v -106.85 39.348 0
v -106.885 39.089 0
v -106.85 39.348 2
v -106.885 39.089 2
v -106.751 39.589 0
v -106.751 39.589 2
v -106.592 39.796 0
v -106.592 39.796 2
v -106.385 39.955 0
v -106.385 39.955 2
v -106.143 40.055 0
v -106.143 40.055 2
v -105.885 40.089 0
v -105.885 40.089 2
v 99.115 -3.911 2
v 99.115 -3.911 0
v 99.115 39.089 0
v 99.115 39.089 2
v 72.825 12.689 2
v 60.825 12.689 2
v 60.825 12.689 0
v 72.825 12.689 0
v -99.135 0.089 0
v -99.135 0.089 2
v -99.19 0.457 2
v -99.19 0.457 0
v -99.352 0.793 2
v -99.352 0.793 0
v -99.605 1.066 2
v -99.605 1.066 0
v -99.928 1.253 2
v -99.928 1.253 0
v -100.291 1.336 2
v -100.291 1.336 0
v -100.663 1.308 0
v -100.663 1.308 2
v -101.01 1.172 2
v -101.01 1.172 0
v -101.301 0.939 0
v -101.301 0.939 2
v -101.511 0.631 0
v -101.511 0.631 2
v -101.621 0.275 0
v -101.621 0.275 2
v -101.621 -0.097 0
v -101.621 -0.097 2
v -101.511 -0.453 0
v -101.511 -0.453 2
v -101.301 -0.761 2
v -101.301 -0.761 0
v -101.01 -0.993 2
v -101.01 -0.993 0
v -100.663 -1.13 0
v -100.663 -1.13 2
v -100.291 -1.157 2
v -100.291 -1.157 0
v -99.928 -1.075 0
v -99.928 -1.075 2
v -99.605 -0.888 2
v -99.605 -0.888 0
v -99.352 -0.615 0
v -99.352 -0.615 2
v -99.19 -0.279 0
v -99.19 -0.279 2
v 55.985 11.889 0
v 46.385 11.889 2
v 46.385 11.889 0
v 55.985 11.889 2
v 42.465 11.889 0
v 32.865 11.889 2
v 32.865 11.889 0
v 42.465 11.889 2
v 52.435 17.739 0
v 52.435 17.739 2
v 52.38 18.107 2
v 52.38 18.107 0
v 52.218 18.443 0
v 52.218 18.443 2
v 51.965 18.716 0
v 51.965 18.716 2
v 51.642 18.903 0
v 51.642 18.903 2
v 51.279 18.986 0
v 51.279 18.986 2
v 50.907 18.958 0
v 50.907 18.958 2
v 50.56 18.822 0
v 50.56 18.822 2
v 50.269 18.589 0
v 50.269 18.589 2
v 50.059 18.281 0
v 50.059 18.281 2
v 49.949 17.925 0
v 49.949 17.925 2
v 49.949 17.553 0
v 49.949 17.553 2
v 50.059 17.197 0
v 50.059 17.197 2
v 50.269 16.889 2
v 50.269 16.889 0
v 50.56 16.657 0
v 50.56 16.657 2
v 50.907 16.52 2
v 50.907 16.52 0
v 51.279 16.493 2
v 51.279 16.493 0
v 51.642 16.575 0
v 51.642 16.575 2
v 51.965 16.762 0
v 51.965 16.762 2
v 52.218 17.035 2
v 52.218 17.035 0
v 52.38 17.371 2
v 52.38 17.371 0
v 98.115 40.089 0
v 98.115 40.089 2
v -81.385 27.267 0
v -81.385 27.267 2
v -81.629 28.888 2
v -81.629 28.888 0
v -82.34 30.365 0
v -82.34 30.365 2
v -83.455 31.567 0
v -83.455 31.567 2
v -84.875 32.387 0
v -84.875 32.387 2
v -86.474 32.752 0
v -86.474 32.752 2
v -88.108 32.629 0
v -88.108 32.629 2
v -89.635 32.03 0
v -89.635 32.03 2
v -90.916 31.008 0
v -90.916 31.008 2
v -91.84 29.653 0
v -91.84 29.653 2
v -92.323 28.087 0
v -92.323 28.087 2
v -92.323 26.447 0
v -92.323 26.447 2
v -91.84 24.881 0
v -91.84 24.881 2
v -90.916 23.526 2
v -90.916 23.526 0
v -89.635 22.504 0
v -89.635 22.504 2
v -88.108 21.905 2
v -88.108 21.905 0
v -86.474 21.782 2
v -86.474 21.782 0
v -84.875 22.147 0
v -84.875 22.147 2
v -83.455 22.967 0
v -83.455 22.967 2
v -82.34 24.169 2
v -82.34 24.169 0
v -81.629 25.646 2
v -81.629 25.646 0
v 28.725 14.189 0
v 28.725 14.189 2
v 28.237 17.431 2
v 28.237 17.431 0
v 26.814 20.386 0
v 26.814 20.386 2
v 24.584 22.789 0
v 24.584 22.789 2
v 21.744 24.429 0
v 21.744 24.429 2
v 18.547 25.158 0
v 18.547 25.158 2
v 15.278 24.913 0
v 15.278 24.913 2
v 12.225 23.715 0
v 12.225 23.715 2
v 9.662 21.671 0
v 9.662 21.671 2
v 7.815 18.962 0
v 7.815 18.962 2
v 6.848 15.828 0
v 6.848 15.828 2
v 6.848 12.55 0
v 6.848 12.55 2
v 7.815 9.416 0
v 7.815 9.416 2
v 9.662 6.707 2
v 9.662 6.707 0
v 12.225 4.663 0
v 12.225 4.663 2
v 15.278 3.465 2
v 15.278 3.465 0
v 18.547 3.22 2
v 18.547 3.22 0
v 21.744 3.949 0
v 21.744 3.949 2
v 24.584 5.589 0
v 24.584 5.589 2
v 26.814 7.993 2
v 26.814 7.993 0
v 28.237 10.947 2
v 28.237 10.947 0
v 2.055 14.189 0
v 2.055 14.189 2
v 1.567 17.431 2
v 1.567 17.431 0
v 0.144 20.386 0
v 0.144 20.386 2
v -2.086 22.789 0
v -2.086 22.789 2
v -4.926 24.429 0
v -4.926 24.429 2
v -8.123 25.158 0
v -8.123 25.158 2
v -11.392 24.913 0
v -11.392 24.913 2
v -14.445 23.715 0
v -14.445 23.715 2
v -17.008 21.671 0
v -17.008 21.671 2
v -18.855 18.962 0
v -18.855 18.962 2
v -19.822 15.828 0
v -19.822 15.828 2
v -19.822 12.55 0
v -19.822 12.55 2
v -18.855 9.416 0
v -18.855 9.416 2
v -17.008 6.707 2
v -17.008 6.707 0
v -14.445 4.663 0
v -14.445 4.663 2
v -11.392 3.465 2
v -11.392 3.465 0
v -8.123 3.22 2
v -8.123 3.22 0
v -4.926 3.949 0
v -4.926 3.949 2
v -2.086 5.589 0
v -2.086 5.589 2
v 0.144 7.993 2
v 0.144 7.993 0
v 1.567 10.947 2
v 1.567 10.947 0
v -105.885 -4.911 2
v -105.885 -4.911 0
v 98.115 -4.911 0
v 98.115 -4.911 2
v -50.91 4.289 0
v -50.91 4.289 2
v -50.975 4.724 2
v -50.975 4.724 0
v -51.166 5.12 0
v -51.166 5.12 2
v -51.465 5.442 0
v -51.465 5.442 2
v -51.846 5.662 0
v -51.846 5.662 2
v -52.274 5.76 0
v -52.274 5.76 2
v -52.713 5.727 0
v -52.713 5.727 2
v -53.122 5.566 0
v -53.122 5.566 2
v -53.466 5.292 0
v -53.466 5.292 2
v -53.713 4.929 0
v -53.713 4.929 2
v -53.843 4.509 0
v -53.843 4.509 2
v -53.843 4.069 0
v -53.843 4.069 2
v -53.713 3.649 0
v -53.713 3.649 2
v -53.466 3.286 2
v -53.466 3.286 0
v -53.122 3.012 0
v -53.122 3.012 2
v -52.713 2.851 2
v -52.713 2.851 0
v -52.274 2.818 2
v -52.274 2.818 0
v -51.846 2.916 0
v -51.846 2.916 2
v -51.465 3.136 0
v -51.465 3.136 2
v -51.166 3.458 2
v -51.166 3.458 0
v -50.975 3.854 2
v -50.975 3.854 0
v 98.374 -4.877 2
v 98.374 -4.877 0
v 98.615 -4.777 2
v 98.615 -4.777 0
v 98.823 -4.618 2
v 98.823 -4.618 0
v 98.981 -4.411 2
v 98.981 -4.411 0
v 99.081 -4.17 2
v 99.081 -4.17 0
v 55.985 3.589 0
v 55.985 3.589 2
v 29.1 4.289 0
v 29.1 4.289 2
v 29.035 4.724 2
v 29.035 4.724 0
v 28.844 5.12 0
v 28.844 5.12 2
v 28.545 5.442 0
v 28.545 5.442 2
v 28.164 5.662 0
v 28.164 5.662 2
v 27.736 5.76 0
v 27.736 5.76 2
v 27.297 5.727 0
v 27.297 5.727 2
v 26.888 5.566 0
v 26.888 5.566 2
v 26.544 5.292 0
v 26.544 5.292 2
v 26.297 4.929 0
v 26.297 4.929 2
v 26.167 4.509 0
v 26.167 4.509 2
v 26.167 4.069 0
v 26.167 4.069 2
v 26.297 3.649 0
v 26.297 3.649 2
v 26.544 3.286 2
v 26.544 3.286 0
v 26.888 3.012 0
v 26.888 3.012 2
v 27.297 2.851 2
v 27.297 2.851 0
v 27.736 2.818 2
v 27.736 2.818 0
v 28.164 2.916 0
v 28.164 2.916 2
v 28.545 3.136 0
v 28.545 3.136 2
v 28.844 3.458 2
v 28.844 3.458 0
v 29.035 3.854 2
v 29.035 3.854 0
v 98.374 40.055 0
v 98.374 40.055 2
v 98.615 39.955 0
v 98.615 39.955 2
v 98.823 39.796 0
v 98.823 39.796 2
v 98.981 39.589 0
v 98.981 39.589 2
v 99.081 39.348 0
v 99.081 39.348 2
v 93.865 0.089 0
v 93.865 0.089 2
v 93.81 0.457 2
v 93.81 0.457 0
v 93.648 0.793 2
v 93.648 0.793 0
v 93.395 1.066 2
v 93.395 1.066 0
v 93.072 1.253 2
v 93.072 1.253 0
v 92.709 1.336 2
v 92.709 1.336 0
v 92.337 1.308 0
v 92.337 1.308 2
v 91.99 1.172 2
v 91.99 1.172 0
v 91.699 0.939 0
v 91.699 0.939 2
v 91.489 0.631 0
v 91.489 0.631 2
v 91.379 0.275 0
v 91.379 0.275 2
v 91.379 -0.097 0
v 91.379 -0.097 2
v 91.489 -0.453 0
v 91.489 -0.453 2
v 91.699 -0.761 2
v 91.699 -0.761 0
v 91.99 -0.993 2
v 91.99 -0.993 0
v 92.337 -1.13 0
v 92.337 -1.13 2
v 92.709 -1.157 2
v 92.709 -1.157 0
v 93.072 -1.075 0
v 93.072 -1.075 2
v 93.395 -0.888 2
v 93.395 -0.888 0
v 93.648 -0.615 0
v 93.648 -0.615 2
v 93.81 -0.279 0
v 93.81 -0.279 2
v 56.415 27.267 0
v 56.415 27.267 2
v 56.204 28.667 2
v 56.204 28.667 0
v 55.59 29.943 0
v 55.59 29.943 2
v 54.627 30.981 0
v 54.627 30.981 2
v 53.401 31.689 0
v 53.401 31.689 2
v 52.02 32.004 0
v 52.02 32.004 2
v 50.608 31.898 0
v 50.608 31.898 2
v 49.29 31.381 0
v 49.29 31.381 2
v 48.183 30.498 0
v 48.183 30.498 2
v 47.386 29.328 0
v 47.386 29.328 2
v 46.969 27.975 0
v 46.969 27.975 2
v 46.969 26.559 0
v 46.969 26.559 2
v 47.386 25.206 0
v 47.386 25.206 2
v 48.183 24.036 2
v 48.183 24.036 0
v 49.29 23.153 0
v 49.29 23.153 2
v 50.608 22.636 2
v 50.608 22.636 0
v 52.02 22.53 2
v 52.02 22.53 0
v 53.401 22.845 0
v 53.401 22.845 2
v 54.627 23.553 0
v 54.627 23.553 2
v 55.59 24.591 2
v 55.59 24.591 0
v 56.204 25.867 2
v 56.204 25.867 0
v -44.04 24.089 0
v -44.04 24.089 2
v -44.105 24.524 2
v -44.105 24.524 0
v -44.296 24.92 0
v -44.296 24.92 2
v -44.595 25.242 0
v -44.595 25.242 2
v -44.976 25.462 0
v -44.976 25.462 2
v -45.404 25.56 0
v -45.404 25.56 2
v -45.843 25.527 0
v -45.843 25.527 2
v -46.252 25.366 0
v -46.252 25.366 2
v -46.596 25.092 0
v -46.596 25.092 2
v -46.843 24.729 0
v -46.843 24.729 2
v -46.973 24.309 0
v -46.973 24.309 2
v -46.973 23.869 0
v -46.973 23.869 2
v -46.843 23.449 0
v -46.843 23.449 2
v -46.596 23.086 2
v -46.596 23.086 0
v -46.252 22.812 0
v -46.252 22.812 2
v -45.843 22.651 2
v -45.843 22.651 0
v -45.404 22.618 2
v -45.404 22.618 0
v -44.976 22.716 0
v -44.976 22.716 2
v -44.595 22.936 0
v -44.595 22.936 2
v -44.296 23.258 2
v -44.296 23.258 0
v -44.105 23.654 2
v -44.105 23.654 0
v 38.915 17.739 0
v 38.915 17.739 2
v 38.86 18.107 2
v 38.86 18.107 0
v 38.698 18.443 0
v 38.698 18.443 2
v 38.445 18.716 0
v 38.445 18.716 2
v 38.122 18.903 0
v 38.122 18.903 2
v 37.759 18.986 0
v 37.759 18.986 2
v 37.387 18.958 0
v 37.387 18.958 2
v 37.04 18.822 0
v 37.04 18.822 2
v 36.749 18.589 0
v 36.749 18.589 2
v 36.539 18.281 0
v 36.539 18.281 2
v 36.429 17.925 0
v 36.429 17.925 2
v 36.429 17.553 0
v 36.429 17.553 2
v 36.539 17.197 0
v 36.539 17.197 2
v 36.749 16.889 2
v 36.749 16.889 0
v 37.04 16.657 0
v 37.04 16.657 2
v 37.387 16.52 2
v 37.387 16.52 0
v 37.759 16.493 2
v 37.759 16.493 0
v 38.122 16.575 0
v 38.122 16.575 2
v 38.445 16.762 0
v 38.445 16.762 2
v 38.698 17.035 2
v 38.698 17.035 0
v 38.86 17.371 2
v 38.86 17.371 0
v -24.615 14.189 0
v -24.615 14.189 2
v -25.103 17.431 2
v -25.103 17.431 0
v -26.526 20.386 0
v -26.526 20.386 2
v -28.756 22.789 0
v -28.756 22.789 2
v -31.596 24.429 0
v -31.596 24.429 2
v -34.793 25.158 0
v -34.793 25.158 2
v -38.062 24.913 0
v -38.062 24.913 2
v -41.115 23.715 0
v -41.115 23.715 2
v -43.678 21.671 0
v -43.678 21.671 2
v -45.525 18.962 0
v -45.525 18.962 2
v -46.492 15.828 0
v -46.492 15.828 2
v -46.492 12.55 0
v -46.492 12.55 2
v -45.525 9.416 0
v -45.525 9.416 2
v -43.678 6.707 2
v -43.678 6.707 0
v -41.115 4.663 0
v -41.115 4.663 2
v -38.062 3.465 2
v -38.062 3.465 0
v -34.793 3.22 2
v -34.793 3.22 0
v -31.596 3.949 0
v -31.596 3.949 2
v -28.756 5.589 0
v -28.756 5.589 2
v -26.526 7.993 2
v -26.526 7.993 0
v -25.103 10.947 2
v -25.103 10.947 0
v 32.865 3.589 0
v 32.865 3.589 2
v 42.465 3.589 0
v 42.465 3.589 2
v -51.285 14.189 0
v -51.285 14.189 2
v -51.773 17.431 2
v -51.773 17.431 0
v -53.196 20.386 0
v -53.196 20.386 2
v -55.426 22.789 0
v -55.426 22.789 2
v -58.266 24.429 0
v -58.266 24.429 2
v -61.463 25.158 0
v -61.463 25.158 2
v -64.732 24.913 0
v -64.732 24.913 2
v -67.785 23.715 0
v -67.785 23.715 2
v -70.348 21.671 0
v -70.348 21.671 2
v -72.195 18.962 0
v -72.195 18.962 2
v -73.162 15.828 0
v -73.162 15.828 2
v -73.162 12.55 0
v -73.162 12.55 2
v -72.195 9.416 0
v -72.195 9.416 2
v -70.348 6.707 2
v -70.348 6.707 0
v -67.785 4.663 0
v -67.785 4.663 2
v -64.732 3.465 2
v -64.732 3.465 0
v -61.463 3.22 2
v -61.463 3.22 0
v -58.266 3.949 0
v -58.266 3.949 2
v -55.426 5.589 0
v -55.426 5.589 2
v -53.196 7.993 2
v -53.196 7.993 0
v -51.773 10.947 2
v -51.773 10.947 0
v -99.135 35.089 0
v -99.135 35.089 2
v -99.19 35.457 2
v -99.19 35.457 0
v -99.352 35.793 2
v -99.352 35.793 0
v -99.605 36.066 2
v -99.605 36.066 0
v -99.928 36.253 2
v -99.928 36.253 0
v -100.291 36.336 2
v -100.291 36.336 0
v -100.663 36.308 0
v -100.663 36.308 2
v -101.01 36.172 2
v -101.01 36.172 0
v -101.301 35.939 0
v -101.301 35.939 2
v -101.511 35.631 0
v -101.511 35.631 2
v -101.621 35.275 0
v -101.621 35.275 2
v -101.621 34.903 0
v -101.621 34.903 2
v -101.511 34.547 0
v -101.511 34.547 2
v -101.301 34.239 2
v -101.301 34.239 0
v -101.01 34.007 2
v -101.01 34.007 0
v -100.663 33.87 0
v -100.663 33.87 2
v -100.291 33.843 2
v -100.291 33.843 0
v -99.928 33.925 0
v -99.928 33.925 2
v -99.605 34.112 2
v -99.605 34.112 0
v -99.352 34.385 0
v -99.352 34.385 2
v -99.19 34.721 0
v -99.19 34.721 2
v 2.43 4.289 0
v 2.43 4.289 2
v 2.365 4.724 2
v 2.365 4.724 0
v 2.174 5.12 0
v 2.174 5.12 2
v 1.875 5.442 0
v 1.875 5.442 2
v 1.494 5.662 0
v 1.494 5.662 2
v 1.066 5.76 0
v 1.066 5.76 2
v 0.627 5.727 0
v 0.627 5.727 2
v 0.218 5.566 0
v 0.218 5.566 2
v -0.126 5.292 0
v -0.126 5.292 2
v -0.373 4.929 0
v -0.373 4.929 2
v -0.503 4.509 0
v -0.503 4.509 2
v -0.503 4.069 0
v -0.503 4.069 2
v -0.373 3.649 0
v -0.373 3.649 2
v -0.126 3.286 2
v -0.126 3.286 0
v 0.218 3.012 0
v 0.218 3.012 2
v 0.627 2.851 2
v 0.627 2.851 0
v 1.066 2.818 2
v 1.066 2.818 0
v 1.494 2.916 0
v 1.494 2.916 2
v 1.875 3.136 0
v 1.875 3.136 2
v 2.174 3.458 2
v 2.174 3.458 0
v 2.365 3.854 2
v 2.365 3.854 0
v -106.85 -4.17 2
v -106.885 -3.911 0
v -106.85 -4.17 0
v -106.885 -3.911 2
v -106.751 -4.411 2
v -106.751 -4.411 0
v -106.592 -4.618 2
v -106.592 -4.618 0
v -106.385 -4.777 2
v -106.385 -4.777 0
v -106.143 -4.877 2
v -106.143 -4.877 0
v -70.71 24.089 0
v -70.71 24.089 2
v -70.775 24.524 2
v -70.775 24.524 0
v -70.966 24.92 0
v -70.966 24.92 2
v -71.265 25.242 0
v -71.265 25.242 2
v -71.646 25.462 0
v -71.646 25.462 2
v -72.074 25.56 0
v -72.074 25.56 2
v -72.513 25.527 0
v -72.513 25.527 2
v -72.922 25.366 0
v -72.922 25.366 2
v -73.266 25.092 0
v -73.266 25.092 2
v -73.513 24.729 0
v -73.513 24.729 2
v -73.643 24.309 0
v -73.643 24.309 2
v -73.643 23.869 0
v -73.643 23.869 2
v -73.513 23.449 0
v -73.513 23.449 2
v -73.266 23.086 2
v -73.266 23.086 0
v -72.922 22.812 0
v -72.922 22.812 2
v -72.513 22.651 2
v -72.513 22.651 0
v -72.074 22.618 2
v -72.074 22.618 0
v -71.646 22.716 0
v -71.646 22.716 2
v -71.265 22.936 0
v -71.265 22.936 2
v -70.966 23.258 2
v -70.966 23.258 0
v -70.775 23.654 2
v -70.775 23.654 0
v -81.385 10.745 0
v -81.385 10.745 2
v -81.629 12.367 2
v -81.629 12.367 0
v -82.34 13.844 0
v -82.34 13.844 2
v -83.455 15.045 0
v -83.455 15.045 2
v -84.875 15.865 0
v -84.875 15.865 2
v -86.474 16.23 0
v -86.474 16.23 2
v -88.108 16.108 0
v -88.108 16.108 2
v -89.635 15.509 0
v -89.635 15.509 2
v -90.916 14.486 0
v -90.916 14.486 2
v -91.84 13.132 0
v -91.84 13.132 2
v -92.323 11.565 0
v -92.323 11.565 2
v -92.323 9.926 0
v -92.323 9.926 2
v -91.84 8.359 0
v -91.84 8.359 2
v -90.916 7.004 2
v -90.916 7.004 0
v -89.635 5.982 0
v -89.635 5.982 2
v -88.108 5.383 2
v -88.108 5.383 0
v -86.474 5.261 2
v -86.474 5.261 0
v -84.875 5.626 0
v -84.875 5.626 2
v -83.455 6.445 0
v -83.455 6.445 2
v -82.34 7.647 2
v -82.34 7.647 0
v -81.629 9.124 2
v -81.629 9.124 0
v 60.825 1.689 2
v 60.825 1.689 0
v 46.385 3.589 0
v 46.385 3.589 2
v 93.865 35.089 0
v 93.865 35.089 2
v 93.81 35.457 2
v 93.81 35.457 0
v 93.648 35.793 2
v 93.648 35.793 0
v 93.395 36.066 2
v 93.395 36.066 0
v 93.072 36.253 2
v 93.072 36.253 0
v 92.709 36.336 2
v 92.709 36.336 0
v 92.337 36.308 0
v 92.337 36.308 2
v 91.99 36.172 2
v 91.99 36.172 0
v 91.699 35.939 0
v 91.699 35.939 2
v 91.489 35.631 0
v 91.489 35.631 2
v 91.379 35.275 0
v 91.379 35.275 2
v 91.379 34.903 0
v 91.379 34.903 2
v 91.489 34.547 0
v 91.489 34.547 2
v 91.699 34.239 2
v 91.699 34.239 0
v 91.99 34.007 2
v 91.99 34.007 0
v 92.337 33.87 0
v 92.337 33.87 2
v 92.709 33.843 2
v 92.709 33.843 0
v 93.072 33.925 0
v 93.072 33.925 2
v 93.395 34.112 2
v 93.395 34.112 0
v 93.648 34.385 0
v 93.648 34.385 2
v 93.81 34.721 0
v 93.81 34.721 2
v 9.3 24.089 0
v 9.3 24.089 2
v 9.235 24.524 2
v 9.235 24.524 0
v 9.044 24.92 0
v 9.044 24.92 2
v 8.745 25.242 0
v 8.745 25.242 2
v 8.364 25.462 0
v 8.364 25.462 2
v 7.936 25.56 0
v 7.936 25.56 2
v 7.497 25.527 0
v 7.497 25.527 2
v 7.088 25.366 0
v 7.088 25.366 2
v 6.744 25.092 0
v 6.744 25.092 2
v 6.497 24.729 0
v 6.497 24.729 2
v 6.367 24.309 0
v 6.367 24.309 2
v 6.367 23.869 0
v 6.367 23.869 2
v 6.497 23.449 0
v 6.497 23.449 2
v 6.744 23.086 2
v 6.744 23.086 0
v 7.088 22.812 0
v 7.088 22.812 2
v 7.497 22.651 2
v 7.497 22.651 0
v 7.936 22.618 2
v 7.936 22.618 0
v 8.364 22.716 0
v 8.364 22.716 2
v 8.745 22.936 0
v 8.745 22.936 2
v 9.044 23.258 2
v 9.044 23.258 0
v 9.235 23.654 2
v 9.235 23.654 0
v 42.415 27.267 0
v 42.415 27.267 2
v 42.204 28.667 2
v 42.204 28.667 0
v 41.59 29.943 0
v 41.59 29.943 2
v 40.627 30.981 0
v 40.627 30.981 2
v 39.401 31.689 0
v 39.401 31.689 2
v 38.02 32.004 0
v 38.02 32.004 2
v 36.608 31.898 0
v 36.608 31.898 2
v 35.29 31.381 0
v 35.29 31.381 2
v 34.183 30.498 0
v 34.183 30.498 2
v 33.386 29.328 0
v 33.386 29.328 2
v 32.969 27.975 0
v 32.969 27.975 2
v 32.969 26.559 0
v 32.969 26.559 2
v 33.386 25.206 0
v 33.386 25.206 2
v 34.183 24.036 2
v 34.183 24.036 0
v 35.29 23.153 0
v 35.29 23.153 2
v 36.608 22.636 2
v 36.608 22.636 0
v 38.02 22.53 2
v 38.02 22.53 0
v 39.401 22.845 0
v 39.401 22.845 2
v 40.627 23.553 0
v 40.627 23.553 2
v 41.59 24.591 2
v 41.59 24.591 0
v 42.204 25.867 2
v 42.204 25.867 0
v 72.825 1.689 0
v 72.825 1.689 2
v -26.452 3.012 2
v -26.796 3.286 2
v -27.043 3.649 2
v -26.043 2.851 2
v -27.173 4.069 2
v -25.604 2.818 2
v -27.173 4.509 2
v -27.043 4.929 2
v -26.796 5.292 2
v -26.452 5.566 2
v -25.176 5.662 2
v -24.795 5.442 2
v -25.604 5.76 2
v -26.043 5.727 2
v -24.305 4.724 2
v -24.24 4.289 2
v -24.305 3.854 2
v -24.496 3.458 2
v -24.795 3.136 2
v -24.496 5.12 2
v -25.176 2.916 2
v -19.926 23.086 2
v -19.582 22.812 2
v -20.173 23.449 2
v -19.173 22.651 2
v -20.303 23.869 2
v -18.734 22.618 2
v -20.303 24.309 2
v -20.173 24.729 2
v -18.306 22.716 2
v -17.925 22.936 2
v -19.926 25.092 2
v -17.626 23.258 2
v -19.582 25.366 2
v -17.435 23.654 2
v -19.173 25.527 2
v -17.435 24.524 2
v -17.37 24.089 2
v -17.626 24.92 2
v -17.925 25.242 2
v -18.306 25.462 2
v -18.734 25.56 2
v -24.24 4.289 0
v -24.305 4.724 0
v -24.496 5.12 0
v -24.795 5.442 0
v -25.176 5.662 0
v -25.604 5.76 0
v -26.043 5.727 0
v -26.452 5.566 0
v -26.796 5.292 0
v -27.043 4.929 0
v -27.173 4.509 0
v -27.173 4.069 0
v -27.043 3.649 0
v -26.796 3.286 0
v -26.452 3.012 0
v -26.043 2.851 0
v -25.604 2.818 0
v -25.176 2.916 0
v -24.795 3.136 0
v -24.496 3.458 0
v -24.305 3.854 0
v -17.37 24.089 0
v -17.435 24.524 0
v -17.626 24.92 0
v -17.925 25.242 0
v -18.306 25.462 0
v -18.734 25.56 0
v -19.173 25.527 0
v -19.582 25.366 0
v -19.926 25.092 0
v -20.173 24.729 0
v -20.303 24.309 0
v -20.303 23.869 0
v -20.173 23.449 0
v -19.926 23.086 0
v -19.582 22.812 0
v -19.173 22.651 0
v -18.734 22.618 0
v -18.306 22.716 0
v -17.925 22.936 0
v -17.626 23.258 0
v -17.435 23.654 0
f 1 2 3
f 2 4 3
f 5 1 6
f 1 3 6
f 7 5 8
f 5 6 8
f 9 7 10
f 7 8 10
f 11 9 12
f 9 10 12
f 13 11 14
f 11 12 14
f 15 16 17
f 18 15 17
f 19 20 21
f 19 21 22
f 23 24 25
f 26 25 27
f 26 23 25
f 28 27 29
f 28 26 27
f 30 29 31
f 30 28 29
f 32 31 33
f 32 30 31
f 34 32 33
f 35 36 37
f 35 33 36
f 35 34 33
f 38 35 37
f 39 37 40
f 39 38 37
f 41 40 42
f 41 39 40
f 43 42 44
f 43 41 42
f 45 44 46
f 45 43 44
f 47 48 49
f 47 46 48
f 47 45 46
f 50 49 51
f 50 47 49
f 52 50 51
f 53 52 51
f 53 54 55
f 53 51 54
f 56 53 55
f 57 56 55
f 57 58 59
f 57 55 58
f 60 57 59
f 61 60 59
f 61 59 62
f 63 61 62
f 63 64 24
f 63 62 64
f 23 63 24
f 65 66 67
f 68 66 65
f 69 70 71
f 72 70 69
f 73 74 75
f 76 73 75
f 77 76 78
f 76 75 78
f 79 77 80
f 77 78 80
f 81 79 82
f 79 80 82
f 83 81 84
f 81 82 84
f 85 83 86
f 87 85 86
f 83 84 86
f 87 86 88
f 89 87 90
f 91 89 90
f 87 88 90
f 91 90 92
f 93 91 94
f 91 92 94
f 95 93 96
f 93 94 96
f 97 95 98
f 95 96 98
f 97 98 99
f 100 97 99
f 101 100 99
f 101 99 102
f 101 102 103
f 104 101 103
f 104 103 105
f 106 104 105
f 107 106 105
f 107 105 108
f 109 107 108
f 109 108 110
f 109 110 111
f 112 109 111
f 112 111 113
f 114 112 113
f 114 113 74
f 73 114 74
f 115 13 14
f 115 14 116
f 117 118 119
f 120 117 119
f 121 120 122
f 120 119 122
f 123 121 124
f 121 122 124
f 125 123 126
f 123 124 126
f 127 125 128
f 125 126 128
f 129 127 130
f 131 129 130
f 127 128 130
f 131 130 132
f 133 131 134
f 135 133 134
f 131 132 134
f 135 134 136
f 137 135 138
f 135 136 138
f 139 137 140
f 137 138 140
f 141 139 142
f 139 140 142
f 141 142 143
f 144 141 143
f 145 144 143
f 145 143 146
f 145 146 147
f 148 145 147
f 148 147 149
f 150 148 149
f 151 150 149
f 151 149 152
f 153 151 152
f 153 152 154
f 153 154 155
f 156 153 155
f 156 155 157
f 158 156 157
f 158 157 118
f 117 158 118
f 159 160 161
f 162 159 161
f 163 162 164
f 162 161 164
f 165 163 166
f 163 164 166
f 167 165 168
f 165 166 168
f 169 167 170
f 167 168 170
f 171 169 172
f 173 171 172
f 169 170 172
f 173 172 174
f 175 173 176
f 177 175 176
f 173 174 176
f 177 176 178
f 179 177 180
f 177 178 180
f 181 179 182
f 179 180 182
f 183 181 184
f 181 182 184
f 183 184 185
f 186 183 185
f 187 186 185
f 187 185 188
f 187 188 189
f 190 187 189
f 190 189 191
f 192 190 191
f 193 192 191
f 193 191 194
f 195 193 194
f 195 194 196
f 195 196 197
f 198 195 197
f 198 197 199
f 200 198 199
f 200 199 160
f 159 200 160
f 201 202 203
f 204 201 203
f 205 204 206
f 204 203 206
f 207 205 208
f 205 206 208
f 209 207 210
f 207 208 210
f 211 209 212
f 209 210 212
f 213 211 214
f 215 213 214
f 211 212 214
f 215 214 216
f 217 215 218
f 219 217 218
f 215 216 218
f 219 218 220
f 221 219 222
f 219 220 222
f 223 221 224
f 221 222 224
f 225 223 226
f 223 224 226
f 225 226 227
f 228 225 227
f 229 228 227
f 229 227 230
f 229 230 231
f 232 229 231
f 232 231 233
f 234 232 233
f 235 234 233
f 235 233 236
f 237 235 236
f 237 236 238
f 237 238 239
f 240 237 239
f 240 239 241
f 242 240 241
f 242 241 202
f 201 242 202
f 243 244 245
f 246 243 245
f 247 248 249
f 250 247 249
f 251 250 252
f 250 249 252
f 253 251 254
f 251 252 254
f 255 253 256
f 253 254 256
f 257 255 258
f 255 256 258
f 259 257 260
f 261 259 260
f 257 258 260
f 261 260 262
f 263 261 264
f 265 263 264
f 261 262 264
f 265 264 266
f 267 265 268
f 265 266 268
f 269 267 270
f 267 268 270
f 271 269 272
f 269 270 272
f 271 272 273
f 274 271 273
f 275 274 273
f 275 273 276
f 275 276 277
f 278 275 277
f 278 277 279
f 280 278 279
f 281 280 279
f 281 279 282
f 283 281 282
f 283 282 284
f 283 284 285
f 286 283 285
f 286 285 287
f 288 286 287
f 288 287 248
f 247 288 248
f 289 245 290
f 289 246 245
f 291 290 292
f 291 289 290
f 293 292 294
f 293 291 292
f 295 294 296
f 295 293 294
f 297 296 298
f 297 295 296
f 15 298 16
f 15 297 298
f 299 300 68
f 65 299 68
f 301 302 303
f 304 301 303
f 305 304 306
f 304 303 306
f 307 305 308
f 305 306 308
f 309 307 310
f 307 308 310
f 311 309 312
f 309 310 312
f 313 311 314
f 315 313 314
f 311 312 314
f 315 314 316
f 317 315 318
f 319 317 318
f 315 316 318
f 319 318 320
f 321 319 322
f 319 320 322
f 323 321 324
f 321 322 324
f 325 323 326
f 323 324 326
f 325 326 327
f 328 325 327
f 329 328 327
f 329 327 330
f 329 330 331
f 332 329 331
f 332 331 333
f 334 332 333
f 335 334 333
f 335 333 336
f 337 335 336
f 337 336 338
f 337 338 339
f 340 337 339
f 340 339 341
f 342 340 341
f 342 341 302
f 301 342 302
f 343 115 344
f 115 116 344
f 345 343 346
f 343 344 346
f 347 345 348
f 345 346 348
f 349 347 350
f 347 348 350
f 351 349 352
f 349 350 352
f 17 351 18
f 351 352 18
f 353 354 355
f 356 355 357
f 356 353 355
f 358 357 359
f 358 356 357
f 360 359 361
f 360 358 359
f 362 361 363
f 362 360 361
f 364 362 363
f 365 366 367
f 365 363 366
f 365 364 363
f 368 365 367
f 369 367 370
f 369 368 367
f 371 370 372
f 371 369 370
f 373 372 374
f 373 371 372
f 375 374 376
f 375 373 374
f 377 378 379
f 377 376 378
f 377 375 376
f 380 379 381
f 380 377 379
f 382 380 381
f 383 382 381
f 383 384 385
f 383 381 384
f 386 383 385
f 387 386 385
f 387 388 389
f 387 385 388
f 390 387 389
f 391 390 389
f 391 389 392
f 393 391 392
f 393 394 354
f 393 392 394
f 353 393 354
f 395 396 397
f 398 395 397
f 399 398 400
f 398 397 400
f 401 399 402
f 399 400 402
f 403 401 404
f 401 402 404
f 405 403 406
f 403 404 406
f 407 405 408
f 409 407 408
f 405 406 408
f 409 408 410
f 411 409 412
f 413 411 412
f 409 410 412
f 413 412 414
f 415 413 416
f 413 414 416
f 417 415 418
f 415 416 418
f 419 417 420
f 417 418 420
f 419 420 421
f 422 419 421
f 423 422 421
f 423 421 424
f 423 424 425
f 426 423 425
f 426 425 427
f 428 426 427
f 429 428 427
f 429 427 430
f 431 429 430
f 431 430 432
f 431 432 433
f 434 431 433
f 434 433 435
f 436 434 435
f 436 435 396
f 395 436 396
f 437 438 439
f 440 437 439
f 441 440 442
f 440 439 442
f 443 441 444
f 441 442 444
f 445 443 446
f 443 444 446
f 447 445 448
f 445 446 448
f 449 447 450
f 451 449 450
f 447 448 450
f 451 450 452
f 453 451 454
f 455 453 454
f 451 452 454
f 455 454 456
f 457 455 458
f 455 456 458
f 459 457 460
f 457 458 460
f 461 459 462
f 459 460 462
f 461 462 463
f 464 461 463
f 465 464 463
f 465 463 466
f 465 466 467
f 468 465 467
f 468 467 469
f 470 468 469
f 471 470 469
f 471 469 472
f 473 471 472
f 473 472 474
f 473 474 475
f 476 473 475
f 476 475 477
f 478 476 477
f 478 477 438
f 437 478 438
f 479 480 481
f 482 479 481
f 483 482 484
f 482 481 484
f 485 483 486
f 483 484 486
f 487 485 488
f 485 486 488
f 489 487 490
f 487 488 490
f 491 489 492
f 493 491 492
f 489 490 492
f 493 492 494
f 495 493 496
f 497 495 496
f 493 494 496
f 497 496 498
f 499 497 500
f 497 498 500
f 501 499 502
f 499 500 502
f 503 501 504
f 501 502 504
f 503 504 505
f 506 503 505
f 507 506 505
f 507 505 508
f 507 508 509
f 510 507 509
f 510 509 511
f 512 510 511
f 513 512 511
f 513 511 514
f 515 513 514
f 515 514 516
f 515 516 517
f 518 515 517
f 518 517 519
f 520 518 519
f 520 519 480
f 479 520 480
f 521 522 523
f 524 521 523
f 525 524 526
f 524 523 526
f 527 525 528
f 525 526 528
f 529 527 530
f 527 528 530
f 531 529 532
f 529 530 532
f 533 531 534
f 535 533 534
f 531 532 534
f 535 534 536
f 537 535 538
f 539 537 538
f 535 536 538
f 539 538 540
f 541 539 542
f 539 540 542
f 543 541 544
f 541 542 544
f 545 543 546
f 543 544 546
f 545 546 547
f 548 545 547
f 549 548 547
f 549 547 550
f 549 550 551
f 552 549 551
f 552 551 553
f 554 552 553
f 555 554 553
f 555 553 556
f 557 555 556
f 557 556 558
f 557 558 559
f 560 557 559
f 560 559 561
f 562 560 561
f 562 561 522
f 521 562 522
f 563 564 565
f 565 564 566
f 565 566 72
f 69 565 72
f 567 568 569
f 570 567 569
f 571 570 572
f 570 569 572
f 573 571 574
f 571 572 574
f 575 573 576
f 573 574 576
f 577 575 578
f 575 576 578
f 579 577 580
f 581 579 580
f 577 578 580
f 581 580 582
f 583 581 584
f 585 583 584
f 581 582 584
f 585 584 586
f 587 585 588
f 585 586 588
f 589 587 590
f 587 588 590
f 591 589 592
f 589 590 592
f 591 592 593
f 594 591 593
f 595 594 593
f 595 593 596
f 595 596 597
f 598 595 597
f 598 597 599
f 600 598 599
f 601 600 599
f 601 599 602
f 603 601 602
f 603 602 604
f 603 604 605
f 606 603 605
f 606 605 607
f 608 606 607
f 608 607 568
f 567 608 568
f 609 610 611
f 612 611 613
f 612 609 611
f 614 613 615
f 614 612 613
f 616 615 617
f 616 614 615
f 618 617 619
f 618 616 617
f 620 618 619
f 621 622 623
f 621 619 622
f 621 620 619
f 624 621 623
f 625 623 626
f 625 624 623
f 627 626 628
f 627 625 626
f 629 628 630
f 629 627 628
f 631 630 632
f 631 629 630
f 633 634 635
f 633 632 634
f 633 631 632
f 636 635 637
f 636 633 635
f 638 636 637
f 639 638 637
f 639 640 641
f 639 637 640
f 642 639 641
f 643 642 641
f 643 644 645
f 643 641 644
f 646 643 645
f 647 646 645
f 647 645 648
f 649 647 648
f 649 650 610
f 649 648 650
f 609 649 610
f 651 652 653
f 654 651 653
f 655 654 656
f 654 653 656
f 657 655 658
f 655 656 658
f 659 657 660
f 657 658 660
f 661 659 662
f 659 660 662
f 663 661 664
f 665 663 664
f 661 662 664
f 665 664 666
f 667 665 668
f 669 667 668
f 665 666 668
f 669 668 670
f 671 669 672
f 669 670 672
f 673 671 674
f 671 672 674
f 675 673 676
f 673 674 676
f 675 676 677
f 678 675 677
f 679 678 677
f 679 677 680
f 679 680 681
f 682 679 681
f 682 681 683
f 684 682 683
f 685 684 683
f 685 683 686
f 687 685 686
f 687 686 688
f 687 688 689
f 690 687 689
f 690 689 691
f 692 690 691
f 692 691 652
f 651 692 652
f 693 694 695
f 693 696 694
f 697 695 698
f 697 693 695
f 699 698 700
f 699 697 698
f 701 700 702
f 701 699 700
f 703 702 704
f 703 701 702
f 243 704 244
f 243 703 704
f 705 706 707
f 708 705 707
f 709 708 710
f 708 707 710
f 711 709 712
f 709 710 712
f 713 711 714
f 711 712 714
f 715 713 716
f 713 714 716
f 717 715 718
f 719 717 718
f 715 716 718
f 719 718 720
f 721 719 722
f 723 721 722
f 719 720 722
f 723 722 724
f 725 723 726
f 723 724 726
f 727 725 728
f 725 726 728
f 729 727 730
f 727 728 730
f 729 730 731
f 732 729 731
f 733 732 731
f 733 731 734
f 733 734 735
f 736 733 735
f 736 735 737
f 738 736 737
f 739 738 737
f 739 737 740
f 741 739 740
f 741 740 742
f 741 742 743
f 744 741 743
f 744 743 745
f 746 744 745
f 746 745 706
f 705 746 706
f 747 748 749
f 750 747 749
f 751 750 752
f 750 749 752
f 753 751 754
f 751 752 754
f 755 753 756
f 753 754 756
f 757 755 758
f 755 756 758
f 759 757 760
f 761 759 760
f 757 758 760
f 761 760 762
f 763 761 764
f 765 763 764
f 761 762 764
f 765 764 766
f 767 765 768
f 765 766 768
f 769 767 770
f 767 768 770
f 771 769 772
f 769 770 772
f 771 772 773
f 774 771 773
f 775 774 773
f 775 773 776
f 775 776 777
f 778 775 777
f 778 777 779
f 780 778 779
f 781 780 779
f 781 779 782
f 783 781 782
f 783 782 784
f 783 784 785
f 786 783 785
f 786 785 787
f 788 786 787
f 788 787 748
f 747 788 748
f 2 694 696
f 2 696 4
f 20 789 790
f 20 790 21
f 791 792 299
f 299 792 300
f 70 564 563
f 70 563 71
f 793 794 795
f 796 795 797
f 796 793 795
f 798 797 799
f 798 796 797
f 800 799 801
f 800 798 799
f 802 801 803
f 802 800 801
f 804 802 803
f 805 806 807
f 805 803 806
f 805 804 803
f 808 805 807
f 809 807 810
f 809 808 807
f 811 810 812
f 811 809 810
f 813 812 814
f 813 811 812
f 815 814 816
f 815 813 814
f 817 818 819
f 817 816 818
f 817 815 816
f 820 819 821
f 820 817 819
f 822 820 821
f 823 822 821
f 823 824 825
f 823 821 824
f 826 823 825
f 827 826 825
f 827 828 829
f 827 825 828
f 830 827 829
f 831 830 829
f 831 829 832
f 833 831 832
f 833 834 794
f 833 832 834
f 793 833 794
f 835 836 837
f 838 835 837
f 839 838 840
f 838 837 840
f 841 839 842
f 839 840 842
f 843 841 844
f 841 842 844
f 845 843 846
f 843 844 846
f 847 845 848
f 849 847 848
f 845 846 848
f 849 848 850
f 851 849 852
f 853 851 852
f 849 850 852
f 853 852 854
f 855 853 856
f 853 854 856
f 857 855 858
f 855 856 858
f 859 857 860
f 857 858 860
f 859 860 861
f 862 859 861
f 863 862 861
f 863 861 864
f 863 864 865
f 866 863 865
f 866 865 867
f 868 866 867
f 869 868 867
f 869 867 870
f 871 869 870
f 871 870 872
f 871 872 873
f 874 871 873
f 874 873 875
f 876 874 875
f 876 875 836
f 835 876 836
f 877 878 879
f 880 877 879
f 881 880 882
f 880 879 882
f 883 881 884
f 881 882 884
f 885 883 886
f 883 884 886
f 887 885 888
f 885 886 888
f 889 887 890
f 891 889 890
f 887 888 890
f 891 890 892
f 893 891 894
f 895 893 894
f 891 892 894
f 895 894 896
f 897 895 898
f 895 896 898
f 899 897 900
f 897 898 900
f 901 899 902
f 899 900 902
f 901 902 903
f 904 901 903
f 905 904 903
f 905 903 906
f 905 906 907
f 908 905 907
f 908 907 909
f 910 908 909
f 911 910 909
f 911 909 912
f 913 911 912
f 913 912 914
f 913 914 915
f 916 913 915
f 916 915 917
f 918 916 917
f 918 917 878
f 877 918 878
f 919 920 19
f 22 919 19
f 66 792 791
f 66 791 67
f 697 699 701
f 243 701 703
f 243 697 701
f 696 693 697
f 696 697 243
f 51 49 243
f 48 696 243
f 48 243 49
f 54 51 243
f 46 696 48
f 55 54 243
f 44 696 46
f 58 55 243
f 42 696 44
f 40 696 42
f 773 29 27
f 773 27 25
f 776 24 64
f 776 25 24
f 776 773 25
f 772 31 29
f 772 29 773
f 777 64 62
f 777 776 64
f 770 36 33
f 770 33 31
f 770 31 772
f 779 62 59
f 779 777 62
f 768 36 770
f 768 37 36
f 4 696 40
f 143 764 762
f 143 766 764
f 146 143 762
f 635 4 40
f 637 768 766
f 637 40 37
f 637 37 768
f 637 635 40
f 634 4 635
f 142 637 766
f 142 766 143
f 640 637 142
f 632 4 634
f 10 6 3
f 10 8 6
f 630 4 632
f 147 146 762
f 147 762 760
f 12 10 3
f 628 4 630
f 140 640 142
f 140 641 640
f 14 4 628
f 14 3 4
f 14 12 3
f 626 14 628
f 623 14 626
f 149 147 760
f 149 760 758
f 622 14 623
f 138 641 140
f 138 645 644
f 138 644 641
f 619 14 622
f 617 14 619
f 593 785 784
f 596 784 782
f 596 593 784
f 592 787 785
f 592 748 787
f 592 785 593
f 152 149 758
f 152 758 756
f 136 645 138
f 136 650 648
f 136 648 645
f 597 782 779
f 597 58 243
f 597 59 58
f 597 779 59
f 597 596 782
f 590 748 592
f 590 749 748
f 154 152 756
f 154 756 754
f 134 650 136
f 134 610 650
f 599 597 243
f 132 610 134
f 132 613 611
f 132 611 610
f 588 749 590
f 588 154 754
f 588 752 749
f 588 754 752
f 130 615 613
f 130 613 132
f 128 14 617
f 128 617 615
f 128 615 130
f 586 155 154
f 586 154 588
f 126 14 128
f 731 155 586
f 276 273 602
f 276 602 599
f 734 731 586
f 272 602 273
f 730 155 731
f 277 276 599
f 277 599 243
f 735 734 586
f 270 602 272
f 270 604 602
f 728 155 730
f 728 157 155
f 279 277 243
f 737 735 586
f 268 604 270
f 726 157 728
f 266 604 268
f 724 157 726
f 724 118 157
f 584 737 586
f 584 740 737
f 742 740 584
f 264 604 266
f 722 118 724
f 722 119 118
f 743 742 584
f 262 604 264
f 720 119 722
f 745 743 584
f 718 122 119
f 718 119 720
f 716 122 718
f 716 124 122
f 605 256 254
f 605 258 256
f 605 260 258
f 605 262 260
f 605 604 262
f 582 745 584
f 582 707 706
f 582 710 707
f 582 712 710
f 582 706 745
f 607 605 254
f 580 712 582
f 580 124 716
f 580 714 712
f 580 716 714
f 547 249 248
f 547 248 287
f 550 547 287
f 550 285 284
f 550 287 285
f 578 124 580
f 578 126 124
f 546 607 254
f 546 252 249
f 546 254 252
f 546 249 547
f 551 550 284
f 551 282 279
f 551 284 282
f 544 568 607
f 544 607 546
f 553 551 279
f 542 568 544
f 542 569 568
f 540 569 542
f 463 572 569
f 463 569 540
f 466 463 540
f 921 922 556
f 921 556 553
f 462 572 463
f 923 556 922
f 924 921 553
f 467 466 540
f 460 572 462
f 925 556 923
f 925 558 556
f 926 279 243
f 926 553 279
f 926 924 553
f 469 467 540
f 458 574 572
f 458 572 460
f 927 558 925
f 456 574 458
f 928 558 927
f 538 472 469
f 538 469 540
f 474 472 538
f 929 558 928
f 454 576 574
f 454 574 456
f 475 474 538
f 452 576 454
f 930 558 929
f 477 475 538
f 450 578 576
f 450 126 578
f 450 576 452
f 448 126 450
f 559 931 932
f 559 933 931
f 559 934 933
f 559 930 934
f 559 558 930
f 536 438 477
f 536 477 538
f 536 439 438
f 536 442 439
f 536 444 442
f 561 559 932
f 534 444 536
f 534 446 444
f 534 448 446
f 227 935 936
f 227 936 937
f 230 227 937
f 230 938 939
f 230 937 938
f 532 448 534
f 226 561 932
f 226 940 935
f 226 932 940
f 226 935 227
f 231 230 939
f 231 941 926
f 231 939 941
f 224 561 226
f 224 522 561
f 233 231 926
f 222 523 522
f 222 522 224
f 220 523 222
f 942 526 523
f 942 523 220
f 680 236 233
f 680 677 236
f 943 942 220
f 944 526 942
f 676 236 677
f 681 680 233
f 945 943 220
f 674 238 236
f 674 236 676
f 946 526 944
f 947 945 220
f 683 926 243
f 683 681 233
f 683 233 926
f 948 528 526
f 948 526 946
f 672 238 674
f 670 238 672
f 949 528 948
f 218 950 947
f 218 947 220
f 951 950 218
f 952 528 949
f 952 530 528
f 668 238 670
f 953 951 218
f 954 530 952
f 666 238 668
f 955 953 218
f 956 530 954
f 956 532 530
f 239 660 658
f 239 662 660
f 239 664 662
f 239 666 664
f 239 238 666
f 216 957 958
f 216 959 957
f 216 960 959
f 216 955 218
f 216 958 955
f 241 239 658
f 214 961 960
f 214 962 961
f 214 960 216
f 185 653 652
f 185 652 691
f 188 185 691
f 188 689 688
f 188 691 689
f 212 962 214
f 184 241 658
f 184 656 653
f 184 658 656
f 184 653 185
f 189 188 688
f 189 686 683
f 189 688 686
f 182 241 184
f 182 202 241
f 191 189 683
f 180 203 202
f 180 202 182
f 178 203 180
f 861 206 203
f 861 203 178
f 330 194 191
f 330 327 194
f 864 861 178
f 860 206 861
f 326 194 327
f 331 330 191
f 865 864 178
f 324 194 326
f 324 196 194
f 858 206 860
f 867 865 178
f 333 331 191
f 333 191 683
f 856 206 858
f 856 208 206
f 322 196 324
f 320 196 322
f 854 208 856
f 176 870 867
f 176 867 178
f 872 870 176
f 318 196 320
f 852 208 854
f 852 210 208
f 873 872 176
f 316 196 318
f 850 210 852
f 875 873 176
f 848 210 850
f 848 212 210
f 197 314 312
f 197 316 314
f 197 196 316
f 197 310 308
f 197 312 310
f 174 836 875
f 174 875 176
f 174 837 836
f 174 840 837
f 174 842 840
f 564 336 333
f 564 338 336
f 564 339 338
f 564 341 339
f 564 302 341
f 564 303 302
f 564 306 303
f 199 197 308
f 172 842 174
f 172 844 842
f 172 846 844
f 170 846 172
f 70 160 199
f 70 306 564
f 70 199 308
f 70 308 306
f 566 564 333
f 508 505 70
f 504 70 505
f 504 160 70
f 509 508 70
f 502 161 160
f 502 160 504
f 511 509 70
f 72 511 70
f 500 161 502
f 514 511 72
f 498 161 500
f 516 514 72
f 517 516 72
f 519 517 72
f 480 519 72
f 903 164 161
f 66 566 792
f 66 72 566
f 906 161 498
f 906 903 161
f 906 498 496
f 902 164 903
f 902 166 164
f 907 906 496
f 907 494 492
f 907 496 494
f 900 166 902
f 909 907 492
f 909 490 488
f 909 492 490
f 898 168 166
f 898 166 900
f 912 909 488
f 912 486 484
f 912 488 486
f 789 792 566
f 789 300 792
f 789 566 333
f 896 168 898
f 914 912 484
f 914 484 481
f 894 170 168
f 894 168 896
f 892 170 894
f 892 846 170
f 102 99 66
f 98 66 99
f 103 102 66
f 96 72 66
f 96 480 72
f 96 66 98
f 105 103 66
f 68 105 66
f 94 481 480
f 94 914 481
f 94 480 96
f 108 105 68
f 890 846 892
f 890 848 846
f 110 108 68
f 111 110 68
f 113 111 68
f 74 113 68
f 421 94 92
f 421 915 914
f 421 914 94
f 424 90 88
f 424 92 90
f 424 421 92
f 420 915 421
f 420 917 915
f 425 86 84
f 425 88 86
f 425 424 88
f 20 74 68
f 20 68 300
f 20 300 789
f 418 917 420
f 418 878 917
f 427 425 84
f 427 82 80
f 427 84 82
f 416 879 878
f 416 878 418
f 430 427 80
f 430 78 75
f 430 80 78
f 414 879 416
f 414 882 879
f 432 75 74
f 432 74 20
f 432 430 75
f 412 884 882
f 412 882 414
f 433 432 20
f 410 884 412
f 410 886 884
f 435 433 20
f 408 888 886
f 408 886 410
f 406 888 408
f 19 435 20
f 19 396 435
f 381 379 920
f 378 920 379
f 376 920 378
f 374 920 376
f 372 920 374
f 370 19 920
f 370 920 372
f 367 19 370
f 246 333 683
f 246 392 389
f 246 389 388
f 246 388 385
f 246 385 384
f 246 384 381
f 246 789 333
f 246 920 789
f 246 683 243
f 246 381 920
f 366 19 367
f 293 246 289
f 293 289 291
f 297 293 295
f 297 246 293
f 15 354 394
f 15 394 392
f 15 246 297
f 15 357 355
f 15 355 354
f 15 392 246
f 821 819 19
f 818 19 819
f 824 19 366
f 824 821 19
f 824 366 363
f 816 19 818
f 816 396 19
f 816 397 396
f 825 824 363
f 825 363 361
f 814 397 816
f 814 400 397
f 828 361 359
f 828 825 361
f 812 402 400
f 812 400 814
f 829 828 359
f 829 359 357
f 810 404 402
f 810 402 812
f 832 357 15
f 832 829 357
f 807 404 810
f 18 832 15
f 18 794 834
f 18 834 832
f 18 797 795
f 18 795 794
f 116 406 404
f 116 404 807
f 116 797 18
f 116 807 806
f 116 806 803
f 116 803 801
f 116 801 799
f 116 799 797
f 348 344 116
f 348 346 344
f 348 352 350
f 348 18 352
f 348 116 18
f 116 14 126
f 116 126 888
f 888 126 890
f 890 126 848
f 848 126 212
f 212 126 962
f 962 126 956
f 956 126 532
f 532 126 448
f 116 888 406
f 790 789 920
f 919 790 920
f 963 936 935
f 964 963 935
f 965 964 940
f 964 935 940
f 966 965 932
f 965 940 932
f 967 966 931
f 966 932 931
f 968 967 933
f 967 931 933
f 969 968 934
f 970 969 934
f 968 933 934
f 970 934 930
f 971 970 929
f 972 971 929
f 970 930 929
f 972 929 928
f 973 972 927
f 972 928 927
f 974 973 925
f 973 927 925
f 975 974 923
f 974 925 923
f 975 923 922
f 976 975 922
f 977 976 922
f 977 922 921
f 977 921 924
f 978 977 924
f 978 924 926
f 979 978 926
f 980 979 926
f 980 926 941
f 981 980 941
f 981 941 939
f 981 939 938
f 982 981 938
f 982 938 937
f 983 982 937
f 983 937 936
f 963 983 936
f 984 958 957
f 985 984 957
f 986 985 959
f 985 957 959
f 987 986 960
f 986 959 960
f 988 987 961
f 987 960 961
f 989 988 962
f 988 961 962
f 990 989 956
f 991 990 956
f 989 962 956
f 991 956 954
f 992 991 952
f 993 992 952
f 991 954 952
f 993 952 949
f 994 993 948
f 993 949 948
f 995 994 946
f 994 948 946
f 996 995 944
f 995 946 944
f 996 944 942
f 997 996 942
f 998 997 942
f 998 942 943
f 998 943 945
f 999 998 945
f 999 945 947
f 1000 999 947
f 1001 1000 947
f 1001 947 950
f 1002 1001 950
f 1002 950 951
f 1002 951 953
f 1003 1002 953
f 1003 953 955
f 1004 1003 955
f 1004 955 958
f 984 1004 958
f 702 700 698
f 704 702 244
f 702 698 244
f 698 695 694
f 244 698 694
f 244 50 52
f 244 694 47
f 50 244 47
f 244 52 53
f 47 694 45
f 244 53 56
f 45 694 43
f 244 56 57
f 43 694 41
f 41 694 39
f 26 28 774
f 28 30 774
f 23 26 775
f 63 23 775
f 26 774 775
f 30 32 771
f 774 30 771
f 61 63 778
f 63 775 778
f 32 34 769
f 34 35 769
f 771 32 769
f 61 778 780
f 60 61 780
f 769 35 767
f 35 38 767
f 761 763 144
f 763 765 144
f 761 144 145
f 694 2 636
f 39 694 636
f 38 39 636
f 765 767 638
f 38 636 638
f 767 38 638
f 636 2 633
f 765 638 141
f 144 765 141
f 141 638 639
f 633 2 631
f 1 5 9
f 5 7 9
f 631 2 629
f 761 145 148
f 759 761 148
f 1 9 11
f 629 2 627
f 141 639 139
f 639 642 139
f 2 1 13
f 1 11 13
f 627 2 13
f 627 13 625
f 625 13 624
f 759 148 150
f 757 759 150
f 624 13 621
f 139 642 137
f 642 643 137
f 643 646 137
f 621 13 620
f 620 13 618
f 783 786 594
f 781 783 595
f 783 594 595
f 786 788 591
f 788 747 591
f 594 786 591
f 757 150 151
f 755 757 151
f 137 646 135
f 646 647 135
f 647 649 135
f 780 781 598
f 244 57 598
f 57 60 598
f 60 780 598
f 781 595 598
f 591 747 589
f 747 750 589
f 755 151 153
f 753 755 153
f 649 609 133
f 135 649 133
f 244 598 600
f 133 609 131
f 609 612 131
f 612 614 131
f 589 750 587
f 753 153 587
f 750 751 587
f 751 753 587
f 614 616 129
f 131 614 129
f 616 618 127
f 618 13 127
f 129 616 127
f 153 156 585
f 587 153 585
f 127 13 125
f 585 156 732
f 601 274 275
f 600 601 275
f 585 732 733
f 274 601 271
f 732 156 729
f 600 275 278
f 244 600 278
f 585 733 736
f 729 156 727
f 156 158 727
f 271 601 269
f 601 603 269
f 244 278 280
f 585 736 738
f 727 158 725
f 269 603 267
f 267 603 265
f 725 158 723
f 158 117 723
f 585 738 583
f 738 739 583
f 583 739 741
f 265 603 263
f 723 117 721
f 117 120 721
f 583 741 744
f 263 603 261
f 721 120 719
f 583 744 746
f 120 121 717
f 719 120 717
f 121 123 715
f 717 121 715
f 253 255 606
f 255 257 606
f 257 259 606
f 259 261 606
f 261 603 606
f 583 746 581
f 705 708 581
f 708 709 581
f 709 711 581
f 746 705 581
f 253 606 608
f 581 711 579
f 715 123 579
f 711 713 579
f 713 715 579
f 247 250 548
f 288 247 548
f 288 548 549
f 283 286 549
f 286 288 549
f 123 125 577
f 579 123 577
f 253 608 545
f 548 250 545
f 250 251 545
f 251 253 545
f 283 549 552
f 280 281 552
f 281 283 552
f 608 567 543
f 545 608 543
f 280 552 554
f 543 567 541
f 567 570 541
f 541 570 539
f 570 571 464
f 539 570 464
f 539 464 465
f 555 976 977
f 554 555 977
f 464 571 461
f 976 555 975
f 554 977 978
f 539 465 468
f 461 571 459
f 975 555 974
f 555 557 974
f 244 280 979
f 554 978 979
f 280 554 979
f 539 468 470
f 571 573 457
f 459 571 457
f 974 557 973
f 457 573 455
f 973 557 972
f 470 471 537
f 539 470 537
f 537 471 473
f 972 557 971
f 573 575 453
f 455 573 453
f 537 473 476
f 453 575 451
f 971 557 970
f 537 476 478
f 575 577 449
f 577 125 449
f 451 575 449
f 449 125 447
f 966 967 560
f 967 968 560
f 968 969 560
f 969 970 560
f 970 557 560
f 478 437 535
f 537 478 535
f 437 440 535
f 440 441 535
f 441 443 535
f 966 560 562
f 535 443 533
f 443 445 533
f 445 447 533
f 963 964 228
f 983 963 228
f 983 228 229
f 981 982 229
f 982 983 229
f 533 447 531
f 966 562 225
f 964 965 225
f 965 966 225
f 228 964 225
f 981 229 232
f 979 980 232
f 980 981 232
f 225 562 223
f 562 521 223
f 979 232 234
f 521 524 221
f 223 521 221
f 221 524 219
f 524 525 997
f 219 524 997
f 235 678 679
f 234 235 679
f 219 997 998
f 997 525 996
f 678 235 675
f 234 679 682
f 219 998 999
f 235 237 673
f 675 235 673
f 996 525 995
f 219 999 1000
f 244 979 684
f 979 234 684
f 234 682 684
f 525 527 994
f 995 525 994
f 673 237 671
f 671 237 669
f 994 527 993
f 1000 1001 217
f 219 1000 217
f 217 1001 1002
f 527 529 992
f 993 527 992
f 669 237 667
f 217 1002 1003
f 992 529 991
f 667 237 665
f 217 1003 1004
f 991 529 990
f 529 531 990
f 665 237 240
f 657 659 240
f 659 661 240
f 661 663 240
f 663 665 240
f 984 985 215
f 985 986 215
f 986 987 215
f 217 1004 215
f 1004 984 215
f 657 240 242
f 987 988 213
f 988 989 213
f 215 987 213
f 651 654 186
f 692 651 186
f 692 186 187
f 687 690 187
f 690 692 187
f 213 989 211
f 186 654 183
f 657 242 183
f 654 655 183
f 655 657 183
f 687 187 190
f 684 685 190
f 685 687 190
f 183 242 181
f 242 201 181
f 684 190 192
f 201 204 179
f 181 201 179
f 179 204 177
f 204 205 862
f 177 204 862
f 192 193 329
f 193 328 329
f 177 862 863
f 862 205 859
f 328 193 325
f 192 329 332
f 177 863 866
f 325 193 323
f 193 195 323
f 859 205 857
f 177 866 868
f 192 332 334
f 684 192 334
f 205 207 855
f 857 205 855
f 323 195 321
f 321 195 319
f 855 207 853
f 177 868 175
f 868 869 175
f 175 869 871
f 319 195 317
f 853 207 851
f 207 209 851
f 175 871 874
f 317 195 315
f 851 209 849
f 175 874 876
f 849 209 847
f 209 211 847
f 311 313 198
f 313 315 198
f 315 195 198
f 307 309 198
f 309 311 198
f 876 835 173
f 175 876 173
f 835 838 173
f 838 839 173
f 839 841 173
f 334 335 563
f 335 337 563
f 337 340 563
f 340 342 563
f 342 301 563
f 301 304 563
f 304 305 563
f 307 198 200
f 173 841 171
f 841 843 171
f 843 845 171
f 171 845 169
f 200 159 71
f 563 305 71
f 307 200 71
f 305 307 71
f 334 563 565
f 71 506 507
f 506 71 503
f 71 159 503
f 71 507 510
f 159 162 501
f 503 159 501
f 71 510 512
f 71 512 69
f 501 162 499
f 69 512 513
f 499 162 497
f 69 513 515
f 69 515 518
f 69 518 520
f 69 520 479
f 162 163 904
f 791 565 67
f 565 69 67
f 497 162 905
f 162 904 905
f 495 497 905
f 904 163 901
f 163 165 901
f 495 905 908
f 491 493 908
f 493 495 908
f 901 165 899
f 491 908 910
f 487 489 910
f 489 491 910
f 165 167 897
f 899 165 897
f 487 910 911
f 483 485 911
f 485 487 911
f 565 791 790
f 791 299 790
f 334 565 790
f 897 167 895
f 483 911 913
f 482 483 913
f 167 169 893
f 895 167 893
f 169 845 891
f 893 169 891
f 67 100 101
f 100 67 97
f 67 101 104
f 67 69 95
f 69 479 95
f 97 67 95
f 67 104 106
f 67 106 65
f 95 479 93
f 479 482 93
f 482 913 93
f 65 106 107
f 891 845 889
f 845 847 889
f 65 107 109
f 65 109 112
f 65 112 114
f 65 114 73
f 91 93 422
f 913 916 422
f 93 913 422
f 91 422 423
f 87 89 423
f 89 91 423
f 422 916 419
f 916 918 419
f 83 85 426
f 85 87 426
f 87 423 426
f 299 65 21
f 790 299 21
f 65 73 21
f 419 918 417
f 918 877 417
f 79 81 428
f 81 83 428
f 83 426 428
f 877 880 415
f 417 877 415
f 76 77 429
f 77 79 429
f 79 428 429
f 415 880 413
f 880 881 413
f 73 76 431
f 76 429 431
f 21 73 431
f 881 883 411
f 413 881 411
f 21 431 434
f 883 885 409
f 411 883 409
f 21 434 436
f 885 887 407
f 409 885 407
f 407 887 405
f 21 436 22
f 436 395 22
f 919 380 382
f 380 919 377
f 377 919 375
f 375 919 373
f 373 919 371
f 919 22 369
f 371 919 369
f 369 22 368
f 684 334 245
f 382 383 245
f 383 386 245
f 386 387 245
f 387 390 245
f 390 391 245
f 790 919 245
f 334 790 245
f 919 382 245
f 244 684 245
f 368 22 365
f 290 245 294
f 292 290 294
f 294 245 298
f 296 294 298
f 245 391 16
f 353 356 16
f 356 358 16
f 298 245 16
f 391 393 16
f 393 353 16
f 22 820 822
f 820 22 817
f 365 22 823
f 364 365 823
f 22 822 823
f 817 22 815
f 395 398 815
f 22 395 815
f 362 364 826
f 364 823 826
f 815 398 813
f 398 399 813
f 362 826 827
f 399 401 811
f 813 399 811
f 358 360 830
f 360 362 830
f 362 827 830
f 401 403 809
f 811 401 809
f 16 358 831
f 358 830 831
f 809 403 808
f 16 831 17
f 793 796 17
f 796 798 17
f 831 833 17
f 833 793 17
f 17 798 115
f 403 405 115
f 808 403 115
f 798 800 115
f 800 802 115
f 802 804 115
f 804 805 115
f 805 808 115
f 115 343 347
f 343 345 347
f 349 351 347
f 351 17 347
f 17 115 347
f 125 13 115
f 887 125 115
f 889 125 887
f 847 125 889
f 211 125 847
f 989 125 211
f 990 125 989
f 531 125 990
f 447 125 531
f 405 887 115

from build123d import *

# Parameters (mm, degrees)
SKETCH_5_W          = 206
SKETCH_5_H          = 45
EXTRUDE_3_DEPTH     = 2
SKETCH_6_W          = 9.6
SKETCH_6_H          = 8.3
SKETCH_6_R          = 11
SKETCH_6_R_2        = 1.474928536
SKETCH_6_R_3        = 1.25
SKETCH_6_R_4        = 4.75
SKETCH_6_R_5        = 5.5
CUT_EXTRUDE_1_DEPTH = 10
SKETCH_1_R          = 1.25
CUT_EXTRUDE_7_DEPTH = 70
FILLET_1_R          = 1


with BuildPart() as part:
    # 草图5 → 凸台-拉伸3 (new body)
    with BuildSketch(Plane.XY):
        with Locations((-3.884539257, 17.589033065)):
            Rectangle(SKETCH_5_W, SKETCH_5_H)
    extrude(amount=EXTRUDE_3_DEPTH)

    # 草图6 → 切除-拉伸1 (cut)
    with BuildSketch(Plane.XY.offset(2)):
        Polygon((60.825460743, 12.689033065), (60.825460743, 1.689033065), (72.825460743, 1.689033065), (72.825460743, 10.089033065), (72.825460743, 12.689033065), align=None)
        with Locations((37.665460743, 7.739033065)):
            Rectangle(SKETCH_6_W, SKETCH_6_H)
        with Locations((51.185460743, 7.739033065)):
            Rectangle(SKETCH_6_W, SKETCH_6_H)
        with Locations((-62.284539257, 14.189033065)):
            Circle(SKETCH_6_R)
        with Locations((-35.614539257, 14.189033065)):
            Circle(SKETCH_6_R)
        with Locations((-8.944539257, 14.189033065)):
            Circle(SKETCH_6_R)
        with Locations((17.725460743, 14.189033065)):
            Circle(SKETCH_6_R)
        with Locations((-72.184539257, 24.089033065)):
            Circle(SKETCH_6_R_2)
        with Locations((-52.384539257, 4.289033065)):
            Circle(SKETCH_6_R_2)
        with Locations((-45.514539257, 24.089033065)):
            Circle(SKETCH_6_R_2)
        with Locations((-25.714539257, 4.289033065)):
            Circle(SKETCH_6_R_2)
        with Locations((-18.844539257, 24.089033065)):
            Circle(SKETCH_6_R_2)
        with Locations((0.955460743, 4.289033065)):
            Circle(SKETCH_6_R_2)
        with Locations((7.825460743, 24.089033065)):
            Circle(SKETCH_6_R_2)
        with Locations((27.625460743, 4.289033065)):
            Circle(SKETCH_6_R_2)
        with Locations((37.665460743, 17.739033065)):
            Circle(SKETCH_6_R_3)
        with Locations((51.185460743, 17.739033065)):
            Circle(SKETCH_6_R_3)
        with Locations((51.665460743, 27.26693986)):
            Circle(SKETCH_6_R_4)
        with Locations((37.665460743, 27.26693986)):
            Circle(SKETCH_6_R_4)
        with Locations((-86.884539257, 27.26693986)):
            Circle(SKETCH_6_R_5)
        with Locations((-86.884539257, 10.74540099)):
            Circle(SKETCH_6_R_5)
    extrude(amount=-CUT_EXTRUDE_1_DEPTH, mode=Mode.SUBTRACT)

    # 草图1 → 切除-拉伸7 (cut)
    with BuildSketch(Plane.XY):
        with Locations((-100.384539257, 35.089033065)):
            Circle(SKETCH_1_R)
        with Locations((-100.384539257, 0.089033065)):
            Circle(SKETCH_1_R)
        with Locations((92.615460743, 0.089033065)):
            Circle(SKETCH_1_R)
        with Locations((92.615460743, 35.089033065)):
            Circle(SKETCH_1_R)
    extrude(amount=CUT_EXTRUDE_7_DEPTH, mode=Mode.SUBTRACT)

    # 圆角1
    fillet_1_edges = [part.edges().sort_by_distance(p)[0] for p in [
        (-106.884539257, -4.910966935, 1),
        (-106.884539257, 40.089033065, 1),
        (99.115460743, -4.910966935, 1),
        (99.115460743, 40.089033065, 1),
    ]]
    fillet(fillet_1_edges, radius=FILLET_1_R)


solid = part.part
